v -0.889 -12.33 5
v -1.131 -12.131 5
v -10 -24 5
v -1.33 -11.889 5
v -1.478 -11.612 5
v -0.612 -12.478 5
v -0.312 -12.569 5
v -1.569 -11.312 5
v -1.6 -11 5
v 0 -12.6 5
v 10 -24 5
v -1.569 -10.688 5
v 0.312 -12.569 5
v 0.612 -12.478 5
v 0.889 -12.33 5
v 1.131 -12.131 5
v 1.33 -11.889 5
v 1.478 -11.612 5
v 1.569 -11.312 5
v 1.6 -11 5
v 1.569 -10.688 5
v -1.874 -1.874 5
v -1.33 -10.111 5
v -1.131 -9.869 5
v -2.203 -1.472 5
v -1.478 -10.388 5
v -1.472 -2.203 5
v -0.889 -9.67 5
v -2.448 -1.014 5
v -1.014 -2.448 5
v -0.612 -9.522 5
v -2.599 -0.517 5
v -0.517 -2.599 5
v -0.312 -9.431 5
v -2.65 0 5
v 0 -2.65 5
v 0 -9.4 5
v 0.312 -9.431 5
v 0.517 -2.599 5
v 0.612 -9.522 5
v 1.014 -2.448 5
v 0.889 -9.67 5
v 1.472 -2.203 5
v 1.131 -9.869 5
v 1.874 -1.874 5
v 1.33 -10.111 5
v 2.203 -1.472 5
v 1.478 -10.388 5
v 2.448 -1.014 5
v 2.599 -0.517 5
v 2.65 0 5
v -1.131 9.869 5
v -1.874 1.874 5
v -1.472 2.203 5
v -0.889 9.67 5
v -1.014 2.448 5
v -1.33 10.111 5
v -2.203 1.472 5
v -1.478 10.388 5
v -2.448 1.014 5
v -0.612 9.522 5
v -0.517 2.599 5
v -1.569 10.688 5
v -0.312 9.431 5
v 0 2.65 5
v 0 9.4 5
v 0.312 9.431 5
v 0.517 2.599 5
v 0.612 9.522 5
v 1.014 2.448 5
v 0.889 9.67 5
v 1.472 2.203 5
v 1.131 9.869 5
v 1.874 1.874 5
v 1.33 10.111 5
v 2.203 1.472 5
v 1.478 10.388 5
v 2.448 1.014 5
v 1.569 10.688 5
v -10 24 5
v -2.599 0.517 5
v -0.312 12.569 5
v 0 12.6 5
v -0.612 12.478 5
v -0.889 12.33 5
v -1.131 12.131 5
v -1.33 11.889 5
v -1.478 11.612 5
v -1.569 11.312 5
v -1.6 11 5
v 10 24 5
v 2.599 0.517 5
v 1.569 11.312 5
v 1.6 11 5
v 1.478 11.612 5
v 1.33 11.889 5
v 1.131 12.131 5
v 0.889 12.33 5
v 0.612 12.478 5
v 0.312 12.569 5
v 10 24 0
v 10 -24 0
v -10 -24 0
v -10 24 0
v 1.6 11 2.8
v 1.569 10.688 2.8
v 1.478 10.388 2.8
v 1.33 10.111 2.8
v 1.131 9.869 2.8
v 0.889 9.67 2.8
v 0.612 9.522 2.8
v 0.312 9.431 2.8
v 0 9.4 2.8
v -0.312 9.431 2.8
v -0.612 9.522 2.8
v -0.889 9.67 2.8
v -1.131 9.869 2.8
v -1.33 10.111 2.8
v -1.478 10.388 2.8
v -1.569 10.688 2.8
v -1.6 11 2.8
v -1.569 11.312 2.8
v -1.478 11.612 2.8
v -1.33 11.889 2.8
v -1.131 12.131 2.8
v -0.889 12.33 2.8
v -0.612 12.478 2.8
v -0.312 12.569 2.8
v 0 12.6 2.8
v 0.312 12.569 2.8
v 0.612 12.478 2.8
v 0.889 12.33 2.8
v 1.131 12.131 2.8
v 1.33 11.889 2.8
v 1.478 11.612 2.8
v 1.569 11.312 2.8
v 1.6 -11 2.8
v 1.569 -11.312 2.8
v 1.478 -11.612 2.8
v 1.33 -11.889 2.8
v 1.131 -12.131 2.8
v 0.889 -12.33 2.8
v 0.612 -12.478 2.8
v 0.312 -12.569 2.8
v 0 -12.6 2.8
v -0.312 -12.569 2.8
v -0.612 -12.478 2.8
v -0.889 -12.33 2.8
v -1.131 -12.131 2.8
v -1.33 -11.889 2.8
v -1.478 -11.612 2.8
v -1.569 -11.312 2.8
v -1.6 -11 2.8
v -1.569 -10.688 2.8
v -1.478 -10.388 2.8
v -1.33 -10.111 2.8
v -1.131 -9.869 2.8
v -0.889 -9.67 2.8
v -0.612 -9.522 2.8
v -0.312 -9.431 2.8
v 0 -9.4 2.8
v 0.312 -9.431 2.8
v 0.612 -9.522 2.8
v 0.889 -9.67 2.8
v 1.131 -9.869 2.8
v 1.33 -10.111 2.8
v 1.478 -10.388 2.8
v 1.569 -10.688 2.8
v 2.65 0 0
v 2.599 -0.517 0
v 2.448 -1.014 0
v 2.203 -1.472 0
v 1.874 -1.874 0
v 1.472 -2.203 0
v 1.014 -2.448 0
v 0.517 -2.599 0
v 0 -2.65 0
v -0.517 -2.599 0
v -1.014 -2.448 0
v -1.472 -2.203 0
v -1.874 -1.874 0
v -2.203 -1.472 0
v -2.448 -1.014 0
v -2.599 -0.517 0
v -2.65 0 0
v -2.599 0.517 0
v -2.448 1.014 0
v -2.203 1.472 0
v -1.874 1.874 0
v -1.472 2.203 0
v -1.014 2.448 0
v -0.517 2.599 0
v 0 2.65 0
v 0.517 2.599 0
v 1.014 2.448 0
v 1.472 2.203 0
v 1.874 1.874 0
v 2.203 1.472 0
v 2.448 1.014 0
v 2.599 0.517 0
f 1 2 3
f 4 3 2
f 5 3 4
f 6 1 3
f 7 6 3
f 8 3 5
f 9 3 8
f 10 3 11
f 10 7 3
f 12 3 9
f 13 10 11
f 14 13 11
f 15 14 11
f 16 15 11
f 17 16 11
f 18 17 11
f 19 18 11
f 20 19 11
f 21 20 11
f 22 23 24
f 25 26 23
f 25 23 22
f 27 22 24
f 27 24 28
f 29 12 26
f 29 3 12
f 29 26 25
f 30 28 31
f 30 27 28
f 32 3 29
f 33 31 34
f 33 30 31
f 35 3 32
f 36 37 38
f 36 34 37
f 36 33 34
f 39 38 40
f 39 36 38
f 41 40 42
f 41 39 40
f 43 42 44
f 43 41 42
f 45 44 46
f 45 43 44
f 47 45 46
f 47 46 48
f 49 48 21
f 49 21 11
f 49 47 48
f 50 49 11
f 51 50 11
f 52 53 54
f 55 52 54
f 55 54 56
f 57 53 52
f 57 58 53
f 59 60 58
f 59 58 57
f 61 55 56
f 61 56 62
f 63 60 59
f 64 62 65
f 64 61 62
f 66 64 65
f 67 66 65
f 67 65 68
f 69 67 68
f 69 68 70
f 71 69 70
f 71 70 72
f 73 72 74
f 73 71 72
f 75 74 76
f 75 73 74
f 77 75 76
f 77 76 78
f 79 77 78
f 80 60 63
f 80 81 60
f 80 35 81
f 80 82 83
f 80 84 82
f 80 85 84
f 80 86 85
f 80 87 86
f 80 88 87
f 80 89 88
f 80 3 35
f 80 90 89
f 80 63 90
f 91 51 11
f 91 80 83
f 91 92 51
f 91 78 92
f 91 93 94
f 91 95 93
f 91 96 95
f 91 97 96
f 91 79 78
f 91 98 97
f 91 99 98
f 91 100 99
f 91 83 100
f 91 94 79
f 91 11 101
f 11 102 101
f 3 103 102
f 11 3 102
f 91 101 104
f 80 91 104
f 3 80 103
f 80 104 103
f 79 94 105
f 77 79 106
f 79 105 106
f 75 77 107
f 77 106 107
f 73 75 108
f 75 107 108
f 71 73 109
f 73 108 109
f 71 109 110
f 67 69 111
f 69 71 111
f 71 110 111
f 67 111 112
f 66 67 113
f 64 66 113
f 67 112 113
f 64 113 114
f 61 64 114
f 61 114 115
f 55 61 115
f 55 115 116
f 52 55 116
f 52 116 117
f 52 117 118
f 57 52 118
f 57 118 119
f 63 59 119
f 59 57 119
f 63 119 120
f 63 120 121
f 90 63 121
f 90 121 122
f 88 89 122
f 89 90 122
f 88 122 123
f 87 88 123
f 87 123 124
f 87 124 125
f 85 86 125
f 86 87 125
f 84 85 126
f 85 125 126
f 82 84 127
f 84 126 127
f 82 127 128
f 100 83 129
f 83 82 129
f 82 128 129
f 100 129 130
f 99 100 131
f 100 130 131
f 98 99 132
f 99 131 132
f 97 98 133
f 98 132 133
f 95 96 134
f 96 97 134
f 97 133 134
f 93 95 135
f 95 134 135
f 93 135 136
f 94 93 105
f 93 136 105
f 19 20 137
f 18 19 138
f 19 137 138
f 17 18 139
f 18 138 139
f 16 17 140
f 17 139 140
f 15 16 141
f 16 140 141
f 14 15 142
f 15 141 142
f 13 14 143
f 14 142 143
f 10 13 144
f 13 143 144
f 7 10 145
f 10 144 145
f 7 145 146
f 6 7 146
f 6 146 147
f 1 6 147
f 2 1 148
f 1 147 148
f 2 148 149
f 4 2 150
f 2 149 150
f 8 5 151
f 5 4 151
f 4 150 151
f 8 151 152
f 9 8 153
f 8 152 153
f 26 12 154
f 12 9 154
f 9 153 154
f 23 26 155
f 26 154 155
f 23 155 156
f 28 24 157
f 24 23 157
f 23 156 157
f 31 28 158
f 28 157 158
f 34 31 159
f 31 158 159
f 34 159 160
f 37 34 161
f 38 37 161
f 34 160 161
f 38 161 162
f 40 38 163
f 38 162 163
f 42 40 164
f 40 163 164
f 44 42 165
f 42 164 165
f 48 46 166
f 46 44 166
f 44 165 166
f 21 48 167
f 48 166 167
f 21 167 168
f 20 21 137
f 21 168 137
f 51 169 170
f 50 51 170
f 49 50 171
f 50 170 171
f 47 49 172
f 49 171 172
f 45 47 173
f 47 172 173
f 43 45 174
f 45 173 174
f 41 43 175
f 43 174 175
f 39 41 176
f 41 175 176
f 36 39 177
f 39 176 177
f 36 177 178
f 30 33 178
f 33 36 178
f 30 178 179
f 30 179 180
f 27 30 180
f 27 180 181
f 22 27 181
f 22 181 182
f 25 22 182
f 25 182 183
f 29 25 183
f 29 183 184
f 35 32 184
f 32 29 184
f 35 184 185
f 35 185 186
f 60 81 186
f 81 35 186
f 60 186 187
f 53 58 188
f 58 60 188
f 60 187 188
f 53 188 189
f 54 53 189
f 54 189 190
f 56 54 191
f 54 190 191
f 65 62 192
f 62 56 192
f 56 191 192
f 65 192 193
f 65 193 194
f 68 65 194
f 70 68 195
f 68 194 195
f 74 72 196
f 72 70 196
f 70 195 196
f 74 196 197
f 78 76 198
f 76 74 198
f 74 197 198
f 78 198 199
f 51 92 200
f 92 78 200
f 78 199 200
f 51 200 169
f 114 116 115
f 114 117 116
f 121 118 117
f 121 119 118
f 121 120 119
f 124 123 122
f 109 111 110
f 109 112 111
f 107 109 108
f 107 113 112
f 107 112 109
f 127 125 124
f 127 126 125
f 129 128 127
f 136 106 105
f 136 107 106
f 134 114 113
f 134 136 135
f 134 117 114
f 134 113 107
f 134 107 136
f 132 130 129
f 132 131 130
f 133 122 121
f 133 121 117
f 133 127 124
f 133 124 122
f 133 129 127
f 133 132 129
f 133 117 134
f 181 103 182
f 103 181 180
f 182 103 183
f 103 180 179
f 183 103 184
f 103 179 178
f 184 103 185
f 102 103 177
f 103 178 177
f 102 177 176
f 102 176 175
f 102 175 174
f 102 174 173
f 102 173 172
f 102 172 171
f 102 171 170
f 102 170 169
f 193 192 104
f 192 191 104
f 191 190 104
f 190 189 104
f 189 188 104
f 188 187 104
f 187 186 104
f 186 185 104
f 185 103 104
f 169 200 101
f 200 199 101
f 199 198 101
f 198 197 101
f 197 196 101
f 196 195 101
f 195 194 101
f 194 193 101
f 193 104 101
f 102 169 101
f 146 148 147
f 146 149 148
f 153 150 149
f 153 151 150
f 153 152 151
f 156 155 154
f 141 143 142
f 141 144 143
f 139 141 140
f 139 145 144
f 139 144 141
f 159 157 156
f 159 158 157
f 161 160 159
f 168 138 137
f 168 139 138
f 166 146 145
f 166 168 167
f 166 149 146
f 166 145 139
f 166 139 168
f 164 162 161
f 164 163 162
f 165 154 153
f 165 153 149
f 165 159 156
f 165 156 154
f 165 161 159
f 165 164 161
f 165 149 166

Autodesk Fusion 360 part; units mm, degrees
sketch "스케치1" plane through (0, 0, 0) normal (0, 0, 1) x (1, 0, 0)
  line L0 (10, 24) -> (-10, 24)
  line L1 (-10, 24) -> (-10, -24)
  line L2 (-10, -24) -> (10, -24)
  line L3 (10, -24) -> (10, 24)
  line L4 (10, 24) -> (-10, -24) construction
  line L5 (-10, 24) -> (10, -24) construction
  line L6 (0, 0) -> (0, 11)
  circle A0 centre (0, 11) radius 1.6
  line L7 (0, 0) -> (0, -11)
  circle A1 centre (0, -11) radius 1.6
  circle A2 centre (0, 0) radius 2.65
  dimension "d1" = 20
  dimension "d2" = 48
  dimension "d3" = 11
  dimension "d4" = 3.2
  dimension "d5" = 11
  dimension "d6" = 3.2
  dimension "d7" = 5.3
extrude "돌출1" add sketch "스케치1" along normal blind 5
extrude "돌출2" add sketch "스케치1" along normal blind 2.8 contours A0 | A1
